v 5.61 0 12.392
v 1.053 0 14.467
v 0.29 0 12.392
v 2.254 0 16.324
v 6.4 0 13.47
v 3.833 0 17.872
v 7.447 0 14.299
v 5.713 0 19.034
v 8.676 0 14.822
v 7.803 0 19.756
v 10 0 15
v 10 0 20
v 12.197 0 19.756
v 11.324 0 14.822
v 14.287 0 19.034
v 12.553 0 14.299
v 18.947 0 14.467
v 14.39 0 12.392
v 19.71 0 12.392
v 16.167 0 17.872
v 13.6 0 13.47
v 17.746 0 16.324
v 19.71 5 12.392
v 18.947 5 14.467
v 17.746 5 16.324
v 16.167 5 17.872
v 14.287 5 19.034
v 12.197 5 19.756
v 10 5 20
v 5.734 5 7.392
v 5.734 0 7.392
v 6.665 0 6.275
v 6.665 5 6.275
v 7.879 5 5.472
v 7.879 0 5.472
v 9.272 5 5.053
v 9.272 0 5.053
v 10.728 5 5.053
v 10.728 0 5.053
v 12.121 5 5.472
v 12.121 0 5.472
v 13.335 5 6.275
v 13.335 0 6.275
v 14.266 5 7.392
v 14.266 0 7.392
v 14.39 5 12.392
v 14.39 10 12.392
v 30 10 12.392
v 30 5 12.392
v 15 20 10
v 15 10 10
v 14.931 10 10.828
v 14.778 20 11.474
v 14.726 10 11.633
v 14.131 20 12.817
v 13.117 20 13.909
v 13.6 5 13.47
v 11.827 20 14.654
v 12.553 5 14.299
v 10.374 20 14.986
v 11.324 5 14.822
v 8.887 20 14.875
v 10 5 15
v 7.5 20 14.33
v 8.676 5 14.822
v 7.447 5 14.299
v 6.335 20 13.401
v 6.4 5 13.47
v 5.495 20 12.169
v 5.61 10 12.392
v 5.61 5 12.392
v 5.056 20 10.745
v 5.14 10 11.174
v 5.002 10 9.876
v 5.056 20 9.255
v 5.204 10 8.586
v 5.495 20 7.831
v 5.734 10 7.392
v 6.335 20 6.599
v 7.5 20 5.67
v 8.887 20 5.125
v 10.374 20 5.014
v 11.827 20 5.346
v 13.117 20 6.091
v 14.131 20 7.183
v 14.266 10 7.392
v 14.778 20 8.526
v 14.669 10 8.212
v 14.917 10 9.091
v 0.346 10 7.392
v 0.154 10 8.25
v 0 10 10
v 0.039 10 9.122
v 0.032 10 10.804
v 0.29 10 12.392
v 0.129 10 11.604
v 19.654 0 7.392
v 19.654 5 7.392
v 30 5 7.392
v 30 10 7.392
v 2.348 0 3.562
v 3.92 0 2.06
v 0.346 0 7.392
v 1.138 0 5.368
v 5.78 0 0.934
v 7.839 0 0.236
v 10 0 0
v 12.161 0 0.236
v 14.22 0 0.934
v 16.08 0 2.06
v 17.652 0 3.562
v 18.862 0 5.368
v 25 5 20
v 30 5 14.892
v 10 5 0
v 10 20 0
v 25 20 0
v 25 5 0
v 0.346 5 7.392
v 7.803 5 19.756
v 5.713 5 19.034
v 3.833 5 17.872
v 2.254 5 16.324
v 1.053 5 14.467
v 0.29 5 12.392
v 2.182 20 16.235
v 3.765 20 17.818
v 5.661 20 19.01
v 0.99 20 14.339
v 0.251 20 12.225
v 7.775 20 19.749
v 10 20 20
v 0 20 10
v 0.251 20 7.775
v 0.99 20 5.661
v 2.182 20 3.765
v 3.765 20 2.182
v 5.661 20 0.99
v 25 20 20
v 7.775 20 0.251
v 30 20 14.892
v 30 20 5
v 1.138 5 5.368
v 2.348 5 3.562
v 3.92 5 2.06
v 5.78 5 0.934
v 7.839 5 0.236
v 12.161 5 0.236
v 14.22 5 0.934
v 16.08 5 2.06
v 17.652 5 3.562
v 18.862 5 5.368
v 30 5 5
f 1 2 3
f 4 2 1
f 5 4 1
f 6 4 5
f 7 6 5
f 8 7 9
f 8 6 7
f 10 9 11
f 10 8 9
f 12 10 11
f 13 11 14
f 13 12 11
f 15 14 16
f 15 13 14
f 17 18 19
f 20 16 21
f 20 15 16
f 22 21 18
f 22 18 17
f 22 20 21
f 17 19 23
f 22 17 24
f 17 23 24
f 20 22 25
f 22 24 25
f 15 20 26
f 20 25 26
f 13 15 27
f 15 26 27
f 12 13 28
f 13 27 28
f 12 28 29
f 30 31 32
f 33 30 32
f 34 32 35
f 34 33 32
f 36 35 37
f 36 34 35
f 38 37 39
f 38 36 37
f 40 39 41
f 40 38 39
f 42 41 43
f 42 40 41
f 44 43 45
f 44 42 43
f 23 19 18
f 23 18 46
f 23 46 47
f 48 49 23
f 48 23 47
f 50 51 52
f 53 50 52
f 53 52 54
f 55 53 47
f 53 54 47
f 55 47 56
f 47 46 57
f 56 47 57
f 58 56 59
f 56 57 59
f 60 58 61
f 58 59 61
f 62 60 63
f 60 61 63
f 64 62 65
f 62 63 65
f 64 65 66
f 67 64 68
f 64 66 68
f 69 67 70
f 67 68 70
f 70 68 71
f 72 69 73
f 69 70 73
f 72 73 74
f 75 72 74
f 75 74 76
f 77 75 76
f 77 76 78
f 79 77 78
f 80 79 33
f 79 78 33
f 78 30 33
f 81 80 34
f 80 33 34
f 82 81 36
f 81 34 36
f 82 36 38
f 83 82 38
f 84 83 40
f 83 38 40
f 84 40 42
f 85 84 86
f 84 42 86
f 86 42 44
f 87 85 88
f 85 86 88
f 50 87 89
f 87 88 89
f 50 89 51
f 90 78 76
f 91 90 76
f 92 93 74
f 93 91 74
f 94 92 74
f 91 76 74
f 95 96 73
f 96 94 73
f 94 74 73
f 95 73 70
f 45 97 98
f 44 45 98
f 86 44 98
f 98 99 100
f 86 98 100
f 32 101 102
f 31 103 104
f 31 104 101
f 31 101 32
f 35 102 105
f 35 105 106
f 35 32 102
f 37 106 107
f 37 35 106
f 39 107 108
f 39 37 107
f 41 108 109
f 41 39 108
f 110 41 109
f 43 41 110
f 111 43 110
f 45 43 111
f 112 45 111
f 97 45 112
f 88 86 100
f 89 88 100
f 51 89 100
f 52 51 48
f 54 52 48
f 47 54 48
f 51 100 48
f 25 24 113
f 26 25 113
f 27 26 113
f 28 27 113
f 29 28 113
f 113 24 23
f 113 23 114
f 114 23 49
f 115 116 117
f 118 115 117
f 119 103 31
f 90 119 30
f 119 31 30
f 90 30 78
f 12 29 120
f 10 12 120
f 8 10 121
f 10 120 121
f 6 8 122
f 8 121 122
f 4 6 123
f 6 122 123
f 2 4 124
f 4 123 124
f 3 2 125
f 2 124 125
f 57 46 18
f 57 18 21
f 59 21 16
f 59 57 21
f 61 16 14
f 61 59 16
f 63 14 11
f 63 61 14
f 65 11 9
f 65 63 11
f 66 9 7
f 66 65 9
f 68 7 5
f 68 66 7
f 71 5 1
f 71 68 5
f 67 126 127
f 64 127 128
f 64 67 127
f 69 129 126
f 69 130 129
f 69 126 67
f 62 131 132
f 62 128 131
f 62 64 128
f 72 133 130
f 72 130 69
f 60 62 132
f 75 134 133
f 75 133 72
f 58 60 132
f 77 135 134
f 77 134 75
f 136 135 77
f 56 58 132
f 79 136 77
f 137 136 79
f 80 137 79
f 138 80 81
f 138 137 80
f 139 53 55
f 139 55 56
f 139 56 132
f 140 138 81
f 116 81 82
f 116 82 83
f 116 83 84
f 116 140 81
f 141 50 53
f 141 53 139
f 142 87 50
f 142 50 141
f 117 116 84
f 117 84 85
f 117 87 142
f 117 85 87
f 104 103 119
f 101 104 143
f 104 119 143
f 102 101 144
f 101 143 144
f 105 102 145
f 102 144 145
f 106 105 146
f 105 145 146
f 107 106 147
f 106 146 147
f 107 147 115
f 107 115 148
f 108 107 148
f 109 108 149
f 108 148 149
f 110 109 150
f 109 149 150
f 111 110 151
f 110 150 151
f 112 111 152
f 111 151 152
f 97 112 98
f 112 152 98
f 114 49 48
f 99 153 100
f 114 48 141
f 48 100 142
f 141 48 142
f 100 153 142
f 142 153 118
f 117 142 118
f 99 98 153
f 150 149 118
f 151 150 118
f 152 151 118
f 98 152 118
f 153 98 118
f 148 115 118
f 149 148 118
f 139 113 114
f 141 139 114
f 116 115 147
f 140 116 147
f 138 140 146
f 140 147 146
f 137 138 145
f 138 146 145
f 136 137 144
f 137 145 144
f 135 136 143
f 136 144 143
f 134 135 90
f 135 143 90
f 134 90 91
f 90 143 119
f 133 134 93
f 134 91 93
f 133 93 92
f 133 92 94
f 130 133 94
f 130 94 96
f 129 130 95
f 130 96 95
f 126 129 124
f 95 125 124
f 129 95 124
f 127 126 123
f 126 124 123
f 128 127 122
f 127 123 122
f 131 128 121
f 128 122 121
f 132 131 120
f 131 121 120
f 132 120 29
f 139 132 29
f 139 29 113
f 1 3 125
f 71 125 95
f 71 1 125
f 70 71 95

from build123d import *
from build123d import SkipClean  # not in build123d's __all__

# Parameters (mm, degrees)
F0_W     = 30
F0_H     = 15
F1_DEPTH = 20
F3_DEPTH = 15.001
F2_R     = 5
F4_DEPTH = 15.001
F5_DEPTH = 5
F6_W     = 10
F6_H     = 5
F7_DEPTH = 30.001
F9_DEPTH = 15.001


with BuildPart() as f1:
    # F0 (on Top) → F1 (new body)
    with BuildSketch(Plane.XY):
        with Locations((15, 12.5)):
            Rectangle(F0_W, F0_H)
    extrude(amount=F1_DEPTH)

    # F2 (on face) → F3 (cut, through all)
    with BuildSketch(Plane.XZ.offset(-5)):
        Polygon((30, 14.8924803361), (30, 20), (25, 20), align=None)
        Polygon((30, 0), (30, 5), (25, 0), align=None)
    extrude(amount=-F3_DEPTH, mode=Mode.SUBTRACT)

    # F2 (on face) → F4 (cut, through all)
    with BuildSketch(Plane.XZ.offset(-5)):
        with Locations((10, 10)):
            Circle(F2_R)
    extrude(amount=-F4_DEPTH, mode=Mode.SUBTRACT)

    # F2 (on face) → F5 (join)
    with BuildSketch(Plane.XZ.offset(-5)):
        with BuildLine():
            ThreePointArc((20, 10), (17.0710678119, 17.0710678119), (10, 20))
            ThreePointArc((10, 20), (2.9289321881, 17.0710678119), (0, 10))
            ThreePointArc((0, 10), (2.9289321881, 2.9289321881), (10, 0))
            ThreePointArc((10, 0), (17.0710678119, 2.9289321881), (20, 10))
        make_face()
        with Locations((10, 10)):
            Circle(F2_R, mode=Mode.SUBTRACT)
    extrude(amount=F5_DEPTH)

    # F6 (on face) → F7 (cut, through all)
    with BuildSketch(Plane.YZ.offset(30)):
        with Locations((5, 9.8924803361)):
            Rectangle(F6_W, F6_H)
    extrude(amount=-F7_DEPTH, mode=Mode.SUBTRACT)

    # F8 (on face) → F9 (cut, through all)
    with BuildSketch(Plane.XZ.offset(-5)):
        with BuildLine():
            Line((0, 20), (0, 10))
            ThreePointArc((0, 10), (2.9289321881, 17.0710678119), (10, 20))
            Line((10, 20), (0, 20))
        make_face()
        with BuildLine():
            Line((0, 10), (0, 0))
            Line((0, 0), (10, 0))
            ThreePointArc((10, 0), (2.9289321881, 2.9289321881), (0, 10))
        make_face()
    with SkipClean():  # cleaning this boolean's faces spoils the solid; the shape is the same uncleaned
        extrude(amount=-F9_DEPTH, mode=Mode.SUBTRACT)


solid = f1.part
